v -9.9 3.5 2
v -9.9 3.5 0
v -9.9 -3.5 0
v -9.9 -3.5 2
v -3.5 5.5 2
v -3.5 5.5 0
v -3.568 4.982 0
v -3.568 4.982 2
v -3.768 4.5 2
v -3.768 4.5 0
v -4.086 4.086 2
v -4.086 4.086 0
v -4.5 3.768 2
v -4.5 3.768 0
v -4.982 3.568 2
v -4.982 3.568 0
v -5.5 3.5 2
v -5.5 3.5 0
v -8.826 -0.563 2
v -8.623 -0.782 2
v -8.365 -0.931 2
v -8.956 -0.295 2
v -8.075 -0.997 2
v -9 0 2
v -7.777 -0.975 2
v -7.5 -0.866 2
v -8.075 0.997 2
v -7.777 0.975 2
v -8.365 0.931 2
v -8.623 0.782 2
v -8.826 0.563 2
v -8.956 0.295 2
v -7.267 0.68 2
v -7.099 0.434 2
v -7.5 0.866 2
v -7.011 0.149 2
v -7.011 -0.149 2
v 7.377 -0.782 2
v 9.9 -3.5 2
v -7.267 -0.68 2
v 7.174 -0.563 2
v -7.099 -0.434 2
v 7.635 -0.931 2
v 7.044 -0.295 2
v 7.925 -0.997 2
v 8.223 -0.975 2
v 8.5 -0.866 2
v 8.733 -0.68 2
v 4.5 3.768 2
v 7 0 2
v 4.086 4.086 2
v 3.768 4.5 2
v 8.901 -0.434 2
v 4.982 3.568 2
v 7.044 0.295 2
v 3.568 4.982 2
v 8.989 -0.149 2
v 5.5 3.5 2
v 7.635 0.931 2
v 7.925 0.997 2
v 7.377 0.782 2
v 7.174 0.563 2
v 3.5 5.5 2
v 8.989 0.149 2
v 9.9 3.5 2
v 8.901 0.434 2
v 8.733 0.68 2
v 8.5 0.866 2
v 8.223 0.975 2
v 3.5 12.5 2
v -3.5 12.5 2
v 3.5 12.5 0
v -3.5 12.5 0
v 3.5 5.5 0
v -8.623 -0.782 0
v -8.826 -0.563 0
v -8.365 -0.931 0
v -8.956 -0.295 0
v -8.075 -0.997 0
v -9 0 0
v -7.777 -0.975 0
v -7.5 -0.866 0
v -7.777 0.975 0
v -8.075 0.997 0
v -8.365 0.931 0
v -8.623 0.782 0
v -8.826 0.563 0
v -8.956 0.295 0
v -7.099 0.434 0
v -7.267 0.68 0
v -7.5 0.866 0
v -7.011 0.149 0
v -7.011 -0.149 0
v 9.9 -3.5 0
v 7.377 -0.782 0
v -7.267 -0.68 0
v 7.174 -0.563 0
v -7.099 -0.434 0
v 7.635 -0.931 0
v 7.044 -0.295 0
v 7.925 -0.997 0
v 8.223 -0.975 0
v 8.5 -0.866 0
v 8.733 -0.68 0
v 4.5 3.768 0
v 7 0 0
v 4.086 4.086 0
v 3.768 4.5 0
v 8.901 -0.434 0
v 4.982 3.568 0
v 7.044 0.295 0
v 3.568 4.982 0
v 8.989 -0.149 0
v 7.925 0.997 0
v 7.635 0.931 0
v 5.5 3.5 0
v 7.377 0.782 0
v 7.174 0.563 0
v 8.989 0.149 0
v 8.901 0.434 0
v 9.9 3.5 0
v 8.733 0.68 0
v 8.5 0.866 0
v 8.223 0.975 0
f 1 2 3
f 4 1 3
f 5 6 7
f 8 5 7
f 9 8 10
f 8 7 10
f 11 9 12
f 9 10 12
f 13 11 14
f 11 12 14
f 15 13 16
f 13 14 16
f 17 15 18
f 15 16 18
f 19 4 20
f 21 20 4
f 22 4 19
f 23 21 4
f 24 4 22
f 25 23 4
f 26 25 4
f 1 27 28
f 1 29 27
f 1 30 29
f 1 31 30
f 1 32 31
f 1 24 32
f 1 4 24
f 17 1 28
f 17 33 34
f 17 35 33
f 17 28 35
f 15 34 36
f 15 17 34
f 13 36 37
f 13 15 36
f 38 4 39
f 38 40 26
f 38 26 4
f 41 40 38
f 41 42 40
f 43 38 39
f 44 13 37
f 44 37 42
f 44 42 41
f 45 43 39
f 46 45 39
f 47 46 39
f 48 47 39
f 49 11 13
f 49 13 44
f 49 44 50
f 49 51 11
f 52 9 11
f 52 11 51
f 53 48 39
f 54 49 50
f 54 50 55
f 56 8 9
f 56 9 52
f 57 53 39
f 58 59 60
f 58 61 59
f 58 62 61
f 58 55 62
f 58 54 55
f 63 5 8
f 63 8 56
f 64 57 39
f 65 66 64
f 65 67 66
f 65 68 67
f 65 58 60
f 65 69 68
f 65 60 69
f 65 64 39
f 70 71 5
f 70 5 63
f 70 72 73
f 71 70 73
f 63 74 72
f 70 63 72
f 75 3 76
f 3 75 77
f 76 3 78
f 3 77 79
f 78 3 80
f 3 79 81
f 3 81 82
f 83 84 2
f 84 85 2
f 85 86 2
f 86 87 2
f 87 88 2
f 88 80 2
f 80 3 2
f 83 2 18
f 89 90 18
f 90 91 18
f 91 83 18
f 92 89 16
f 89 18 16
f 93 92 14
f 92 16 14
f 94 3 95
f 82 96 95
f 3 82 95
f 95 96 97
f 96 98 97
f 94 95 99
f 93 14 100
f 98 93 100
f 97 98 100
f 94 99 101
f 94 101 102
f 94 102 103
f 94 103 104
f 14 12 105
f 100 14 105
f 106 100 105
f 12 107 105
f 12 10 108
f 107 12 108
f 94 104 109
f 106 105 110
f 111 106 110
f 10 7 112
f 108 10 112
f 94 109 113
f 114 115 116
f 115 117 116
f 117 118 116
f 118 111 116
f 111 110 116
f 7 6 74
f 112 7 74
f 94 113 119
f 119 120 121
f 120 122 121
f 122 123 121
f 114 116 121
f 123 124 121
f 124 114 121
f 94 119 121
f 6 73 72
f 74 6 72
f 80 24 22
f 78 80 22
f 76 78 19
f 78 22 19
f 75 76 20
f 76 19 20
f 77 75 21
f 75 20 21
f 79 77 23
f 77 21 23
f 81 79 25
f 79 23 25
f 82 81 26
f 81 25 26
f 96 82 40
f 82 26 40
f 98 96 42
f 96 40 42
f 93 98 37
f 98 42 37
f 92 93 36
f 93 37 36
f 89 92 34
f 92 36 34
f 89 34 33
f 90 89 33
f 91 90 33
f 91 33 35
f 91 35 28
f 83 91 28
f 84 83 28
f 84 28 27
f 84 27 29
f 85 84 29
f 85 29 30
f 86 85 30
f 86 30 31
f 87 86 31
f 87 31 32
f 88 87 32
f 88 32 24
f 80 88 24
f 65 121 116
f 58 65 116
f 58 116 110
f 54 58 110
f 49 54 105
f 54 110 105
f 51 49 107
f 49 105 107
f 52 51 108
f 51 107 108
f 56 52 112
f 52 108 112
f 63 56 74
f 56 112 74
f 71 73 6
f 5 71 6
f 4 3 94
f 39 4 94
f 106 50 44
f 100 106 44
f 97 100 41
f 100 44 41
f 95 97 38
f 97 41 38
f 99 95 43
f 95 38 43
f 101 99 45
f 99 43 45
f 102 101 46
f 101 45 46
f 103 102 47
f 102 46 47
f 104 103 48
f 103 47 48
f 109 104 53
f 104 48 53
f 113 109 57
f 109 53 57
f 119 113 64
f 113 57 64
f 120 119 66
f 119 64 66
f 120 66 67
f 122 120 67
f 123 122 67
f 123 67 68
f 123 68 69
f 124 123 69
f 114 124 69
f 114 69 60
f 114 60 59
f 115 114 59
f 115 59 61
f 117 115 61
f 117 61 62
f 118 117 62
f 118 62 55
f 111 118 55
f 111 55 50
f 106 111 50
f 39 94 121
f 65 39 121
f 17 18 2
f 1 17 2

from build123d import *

# Parameters (mm, degrees)
F1_DEPTH = 2
F2_D     = 2


with BuildPart() as f1:
    # F0 (on Top) → F1 (new body)
    with BuildSketch(Plane.XY):
        Polygon((-9.9, -3.5), (9.9, -3.5), (9.9, 3.5), (5.5, 3.5), (3.5, 3.5), (-3.5, 3.5), (-5.5, 3.5), (-9.9, 3.5), align=None)
        Polygon((-3.5, 3.5), (3.5, 3.5), (3.5, 5.5), (3.5, 12.5), (-3.5, 12.5), (-3.5, 5.5), align=None)
        with BuildLine():
            ThreePointArc((-3.5, 5.5), (-4.085786, 4.085786), (-5.5, 3.5))
            Line((-5.5, 3.5), (-3.5, 3.5))
            Line((-3.5, 3.5), (-3.5, 5.5))
        make_face()
        with BuildLine():
            Line((3.5, 3.5), (5.5, 3.5))
            ThreePointArc((5.5, 3.5), (4.085786, 4.085786), (3.5, 5.5))
            Line((3.5, 5.5), (3.5, 3.5))
        make_face()
    extrude(amount=F1_DEPTH)

    # F2 (through all)
    with Locations(Plane(origin=(0, 0, 0), x_dir=(1, 0, 0), z_dir=(0, 0, -1))):
        with Locations((-8, 0), (8, 0)):
            Hole(F2_D / 2)


solid = f1.part
